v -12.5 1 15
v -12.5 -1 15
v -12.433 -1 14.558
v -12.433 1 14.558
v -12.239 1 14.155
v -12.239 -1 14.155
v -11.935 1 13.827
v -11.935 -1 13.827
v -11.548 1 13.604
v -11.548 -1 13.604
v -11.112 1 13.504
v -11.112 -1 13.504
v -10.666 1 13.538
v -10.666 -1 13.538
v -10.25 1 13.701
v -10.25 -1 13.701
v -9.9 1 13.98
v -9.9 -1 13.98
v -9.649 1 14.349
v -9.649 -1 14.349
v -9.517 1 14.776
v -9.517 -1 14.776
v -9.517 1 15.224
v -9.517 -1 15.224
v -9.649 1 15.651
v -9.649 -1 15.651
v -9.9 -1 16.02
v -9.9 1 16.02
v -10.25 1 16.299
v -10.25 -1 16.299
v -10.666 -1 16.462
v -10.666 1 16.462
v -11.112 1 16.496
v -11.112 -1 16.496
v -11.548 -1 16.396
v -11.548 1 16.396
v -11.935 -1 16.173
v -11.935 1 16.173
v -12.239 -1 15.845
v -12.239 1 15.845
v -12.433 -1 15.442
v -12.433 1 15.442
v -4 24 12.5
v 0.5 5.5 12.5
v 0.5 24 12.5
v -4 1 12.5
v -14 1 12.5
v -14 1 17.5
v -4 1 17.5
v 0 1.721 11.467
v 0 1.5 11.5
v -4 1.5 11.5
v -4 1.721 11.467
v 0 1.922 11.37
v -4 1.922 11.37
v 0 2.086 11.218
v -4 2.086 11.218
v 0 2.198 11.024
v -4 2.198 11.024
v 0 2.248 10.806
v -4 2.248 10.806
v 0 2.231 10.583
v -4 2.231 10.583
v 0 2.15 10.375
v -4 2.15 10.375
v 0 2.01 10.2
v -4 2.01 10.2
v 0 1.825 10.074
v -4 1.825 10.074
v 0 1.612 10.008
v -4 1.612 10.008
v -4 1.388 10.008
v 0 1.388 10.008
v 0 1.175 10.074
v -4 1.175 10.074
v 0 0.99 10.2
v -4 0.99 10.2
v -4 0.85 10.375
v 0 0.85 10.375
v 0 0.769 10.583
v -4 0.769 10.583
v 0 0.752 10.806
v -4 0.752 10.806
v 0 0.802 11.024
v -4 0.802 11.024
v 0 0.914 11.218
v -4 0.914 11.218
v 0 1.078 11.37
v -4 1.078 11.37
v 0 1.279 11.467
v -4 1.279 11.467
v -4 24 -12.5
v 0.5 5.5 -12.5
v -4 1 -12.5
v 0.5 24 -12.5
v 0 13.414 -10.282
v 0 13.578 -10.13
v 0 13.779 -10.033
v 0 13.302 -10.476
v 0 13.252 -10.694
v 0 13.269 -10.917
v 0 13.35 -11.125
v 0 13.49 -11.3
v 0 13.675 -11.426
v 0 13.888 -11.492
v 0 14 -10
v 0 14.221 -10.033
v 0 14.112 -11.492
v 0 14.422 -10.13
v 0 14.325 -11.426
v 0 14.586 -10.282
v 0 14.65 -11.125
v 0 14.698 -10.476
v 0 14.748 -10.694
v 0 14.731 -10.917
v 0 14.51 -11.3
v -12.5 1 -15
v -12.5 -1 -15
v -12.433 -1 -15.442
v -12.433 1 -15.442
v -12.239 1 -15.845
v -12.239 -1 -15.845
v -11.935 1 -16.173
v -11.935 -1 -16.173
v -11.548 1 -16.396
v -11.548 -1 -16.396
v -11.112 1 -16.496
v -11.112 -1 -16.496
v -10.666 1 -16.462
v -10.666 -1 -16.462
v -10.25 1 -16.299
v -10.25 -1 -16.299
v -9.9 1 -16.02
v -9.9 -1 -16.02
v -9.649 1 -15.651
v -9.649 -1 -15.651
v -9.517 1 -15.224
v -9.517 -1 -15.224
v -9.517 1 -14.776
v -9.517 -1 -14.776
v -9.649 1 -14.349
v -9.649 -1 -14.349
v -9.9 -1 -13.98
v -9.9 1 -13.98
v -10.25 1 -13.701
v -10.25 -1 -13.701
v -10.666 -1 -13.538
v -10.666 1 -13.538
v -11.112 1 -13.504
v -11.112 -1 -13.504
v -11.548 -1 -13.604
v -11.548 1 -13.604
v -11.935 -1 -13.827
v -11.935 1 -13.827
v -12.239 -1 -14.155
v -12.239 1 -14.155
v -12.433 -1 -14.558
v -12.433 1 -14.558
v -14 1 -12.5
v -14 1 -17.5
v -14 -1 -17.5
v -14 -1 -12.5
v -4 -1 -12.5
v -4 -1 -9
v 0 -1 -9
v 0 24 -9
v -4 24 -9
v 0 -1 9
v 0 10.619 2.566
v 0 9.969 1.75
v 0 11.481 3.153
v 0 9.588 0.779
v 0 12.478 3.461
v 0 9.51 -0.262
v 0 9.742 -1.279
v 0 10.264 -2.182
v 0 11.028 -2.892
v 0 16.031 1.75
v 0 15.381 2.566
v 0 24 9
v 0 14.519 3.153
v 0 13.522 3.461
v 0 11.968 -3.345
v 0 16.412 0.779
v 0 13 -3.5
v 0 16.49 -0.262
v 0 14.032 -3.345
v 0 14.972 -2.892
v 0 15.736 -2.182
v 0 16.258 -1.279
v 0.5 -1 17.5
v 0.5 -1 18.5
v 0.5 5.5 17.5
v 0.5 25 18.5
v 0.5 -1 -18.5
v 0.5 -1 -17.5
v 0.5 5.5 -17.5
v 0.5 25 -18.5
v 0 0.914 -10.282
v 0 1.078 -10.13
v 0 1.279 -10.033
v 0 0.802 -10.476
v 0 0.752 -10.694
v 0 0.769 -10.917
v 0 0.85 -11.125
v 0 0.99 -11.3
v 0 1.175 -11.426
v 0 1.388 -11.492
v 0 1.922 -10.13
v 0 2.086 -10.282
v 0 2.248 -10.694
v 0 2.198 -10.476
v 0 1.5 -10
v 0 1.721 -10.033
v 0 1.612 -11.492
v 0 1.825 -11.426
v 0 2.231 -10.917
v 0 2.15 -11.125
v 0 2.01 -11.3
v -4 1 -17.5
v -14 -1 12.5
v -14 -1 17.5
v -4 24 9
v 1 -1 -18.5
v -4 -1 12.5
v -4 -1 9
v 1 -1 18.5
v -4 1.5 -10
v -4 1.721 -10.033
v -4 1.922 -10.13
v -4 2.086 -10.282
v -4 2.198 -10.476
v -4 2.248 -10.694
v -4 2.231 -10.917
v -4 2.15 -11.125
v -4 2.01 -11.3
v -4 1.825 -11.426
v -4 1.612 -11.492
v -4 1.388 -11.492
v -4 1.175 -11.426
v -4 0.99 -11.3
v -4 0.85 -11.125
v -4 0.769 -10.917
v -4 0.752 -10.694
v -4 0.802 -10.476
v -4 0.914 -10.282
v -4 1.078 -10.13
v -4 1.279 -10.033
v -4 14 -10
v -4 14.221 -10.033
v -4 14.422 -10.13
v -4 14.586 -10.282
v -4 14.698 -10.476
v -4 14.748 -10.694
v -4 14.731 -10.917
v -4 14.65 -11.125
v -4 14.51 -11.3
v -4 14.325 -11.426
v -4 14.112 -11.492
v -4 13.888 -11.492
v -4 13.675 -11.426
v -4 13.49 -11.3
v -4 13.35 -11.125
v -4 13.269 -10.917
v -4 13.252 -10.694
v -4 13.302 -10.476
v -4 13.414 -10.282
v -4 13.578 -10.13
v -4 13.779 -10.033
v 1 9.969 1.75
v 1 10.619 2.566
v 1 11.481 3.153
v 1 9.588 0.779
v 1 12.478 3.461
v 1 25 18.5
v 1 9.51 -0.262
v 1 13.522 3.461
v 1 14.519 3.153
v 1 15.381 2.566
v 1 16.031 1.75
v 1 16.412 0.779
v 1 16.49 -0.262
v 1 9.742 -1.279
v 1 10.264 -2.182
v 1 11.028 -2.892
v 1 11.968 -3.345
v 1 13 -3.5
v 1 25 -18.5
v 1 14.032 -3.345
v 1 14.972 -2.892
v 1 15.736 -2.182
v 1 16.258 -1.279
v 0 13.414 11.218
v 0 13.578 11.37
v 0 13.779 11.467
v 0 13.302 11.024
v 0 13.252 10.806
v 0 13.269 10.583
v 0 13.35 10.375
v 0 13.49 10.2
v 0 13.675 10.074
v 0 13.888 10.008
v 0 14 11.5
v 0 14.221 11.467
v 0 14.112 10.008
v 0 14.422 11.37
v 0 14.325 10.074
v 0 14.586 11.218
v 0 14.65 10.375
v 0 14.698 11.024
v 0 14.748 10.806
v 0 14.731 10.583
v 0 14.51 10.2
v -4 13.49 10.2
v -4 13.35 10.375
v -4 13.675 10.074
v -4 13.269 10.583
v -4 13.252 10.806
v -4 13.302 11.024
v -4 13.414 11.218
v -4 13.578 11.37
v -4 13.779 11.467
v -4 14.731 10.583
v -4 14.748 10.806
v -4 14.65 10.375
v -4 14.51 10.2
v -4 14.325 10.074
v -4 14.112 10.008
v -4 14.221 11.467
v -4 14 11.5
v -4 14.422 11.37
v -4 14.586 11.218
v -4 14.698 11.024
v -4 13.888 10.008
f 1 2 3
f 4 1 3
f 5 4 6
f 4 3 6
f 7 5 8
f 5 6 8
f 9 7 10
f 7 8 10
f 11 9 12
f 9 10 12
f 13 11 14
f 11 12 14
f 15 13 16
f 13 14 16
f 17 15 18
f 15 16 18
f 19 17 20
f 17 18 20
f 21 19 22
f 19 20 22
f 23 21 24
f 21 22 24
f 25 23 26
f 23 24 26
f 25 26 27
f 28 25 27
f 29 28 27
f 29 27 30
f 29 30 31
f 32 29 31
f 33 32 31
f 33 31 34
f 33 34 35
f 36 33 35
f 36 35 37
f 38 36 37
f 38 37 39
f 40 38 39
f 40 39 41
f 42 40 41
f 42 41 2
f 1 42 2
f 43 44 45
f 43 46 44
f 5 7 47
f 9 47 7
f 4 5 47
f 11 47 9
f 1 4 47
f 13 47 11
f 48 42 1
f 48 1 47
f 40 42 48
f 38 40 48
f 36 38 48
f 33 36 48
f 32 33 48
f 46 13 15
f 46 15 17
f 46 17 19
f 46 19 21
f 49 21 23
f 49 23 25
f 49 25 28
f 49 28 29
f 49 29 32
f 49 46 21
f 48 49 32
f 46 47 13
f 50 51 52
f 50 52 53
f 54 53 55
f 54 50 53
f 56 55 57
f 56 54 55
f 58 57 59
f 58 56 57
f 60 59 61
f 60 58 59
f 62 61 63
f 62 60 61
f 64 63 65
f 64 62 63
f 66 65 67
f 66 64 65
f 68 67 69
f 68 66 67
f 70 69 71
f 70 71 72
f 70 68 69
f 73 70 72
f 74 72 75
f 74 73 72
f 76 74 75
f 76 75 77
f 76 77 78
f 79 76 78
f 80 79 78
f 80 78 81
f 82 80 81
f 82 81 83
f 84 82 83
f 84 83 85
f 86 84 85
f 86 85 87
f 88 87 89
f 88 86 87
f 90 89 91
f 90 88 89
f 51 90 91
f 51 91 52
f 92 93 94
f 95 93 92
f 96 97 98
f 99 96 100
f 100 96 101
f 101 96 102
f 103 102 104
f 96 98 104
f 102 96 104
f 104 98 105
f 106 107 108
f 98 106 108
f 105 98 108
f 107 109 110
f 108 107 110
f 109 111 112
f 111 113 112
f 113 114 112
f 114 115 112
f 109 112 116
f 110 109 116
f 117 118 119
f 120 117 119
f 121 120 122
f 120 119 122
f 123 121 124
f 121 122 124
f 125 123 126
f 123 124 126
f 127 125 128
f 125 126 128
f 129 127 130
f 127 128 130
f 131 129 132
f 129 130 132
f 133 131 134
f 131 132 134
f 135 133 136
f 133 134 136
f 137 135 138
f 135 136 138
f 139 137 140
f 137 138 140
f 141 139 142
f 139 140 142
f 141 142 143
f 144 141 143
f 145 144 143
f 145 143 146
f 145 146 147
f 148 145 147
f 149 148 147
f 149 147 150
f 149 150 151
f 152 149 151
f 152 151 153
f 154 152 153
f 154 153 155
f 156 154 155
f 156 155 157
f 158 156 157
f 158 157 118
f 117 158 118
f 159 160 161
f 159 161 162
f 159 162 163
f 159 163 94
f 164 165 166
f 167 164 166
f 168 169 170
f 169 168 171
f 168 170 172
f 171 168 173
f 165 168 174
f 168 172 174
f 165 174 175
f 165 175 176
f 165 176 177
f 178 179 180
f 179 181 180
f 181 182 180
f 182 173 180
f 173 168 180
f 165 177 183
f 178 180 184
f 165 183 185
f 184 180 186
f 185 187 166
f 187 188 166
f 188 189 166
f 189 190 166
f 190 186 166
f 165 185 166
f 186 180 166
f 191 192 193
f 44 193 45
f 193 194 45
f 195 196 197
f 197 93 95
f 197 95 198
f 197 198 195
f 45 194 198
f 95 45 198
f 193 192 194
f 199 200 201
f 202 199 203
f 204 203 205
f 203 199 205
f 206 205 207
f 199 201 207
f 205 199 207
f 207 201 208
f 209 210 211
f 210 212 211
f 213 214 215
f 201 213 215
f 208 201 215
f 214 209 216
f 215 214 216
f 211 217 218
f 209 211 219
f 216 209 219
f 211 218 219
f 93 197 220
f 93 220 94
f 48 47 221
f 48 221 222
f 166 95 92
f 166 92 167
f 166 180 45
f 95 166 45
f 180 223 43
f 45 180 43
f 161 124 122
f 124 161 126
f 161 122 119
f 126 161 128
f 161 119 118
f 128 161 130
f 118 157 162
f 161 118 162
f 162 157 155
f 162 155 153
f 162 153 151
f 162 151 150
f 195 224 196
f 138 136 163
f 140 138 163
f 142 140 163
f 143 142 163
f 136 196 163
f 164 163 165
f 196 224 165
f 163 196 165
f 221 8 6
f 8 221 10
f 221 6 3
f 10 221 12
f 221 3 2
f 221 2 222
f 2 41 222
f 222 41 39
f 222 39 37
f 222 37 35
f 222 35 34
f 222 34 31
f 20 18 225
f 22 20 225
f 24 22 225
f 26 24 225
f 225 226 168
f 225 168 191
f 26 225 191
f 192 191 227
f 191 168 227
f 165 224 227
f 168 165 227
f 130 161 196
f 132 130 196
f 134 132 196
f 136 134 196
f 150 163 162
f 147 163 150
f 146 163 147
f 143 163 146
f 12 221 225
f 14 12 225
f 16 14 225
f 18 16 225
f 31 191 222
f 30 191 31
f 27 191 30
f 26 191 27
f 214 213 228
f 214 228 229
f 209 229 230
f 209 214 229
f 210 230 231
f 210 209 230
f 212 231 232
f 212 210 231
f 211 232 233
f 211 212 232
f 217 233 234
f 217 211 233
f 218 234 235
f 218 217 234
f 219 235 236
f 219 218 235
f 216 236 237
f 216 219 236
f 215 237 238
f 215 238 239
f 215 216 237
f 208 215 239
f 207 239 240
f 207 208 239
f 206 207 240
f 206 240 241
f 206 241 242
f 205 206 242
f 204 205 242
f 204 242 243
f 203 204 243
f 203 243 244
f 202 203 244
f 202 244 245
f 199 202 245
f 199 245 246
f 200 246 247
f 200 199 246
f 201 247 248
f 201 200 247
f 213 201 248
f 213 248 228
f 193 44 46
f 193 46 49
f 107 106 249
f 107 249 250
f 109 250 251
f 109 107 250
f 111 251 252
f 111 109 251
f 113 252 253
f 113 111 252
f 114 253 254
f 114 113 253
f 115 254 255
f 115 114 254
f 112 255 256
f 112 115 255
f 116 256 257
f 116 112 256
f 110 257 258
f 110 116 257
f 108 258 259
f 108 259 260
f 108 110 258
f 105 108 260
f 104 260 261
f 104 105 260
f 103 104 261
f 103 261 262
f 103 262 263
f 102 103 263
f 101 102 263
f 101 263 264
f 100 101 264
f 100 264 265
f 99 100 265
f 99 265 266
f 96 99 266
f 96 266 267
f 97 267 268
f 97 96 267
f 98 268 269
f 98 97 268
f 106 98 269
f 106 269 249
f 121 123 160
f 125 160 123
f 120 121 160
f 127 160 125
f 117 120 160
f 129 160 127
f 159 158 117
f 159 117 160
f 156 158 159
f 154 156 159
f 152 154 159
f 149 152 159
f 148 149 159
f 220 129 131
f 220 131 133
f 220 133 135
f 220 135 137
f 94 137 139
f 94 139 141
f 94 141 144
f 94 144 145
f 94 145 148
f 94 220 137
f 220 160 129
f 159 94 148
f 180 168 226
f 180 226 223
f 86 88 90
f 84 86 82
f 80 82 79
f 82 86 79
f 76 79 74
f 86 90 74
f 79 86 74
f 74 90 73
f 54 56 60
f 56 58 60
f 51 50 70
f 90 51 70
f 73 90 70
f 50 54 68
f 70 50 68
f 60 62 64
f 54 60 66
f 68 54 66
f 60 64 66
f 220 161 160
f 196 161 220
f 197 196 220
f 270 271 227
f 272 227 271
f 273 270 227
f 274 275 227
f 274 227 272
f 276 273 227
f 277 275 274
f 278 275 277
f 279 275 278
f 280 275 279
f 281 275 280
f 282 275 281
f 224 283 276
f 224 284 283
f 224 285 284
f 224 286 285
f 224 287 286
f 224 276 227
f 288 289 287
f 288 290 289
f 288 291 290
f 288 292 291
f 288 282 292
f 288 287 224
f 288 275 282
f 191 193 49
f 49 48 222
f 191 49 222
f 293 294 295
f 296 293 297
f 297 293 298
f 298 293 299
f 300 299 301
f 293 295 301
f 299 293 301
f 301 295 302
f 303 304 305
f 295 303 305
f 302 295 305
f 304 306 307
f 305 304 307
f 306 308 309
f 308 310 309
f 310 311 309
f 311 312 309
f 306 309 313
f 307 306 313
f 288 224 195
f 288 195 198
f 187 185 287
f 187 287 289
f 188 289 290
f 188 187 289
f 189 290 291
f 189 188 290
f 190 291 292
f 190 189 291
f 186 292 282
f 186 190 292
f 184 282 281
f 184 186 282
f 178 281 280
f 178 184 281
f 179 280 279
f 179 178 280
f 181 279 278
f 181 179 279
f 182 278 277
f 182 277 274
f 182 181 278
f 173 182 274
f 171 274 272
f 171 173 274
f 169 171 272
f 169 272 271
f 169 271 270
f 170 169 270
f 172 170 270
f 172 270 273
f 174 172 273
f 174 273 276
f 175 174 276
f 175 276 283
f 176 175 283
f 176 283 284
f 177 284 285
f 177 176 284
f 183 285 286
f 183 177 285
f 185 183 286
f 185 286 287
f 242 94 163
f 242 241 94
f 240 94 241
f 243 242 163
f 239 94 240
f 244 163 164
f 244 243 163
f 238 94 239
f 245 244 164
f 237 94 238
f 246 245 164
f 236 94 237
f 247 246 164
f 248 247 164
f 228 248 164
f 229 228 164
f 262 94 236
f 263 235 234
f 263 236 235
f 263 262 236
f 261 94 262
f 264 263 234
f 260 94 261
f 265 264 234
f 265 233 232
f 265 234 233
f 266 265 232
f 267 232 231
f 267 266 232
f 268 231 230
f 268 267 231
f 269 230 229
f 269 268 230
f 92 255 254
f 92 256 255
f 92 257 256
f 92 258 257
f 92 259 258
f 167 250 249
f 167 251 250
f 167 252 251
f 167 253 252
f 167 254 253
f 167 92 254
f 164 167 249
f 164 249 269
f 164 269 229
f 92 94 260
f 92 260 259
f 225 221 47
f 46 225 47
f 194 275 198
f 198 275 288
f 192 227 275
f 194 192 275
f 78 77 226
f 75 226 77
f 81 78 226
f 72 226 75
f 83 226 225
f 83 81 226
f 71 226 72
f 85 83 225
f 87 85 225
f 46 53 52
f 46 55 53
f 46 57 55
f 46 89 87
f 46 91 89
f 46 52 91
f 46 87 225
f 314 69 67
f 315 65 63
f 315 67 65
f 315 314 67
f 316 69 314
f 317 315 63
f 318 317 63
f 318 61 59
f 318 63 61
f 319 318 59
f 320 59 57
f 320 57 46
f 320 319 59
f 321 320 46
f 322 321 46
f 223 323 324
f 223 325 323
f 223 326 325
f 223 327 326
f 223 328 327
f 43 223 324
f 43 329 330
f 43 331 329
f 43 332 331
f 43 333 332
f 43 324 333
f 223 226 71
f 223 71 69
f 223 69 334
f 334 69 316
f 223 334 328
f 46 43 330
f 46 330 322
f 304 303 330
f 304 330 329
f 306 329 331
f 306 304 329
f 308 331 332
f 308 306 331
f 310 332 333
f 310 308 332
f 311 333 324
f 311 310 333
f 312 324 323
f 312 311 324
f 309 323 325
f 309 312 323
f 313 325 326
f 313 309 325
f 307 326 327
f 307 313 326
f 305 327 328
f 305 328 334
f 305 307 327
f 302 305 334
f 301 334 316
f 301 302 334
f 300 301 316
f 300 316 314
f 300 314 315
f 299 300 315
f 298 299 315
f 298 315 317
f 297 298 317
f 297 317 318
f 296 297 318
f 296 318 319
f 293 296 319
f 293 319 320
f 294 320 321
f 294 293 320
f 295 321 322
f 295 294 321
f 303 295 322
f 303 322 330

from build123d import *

# Parameters (mm, degrees)
SKIZZE2_W                      = 25
SKIZZE2_H                      = 25
SKIZZE2_R                      = 3.5
FRONT_FACE_DEPTH               = 1
SKIZZE3_W                      = 3.5
SKIZZE3_H                      = 26
SKIZZE3_R                      = 0.75
CAMERA_SPACER_DEPTH            = 4
FLOOR_PLATE_DEPTH              = 14
FLOOR_PLATE_DEPTH_BACK         = 0.5
SKIZZE6_W                      = 5
SKIZZE6_H                      = 2
SKIZZE7_W                      = 6
SKIZZE7_H                      = 26
SIDE_COVERS_DEPTH              = 0.5
TOP_COVER_REACH                = 34.669
SKIZZE8_W                      = 25
SKIZZE8_H                      = 1
FASE1_SIZE                     = 4.5
F_3_0_3_DURCHMESSER_BOHRUNG1_D = 3


with BuildPart() as part:
    # Skizze2 → Front Face (new body)
    # profile 1 of 2: a face of its own
    with BuildSketch(Plane(origin=(0, 0, 0), x_dir=(0, 0, -1), z_dir=(1, 0, 0))):
        with Locations((0, 12.5)):
            Rectangle(SKIZZE2_W, SKIZZE2_H)
        with Locations((0, 13)):
            Circle(SKIZZE2_R, mode=Mode.SUBTRACT)
    # profile 2 of 2: a face of its own
    with BuildSketch(Plane(origin=(0, 0, 0), x_dir=(0, 0, -1), z_dir=(1, 0, 0))):
        Polygon((12.5, 0), (-12.5, 0), (-17.5, 0), (-17.5, -1), (17.5, -1), (17.5, 0), align=None)
    extrude(amount=FRONT_FACE_DEPTH)

    # Skizze3 → Camera Spacer (add)
    # profile 1 of 2: a face of its own
    with BuildSketch(Plane.ZY):
        with Locations((-10.75, 12)):
            Rectangle(SKIZZE3_W, SKIZZE3_H)
        with Locations((-10.75, 14)):
            Circle(SKIZZE3_R, mode=Mode.SUBTRACT)
        with Locations((-10.75, 1.5)):
            Circle(SKIZZE3_R, mode=Mode.SUBTRACT)
    # profile 2 of 2: a face of its own
    with BuildSketch(Plane.ZY):
        with Locations((10.75, 12)):
            Rectangle(SKIZZE3_W, SKIZZE3_H)
        with Locations((10.75, 1.5)):
            Circle(SKIZZE3_R, mode=Mode.SUBTRACT)
        with Locations((10.75, 14)):
            Circle(SKIZZE3_R, mode=Mode.SUBTRACT)
    extrude(amount=CAMERA_SPACER_DEPTH)

    # Skizze6 → Floor Plate (add, two sides: drawn at the far end of the back side and taken through both)
    with BuildSketch(Plane.ZY.offset(-FLOOR_PLATE_DEPTH_BACK)):
        with Locations((-15, 0)):
            Rectangle(SKIZZE6_W, SKIZZE6_H)
        with Locations((15, 0)):
            Rectangle(SKIZZE6_W, SKIZZE6_H)
    extrude(amount=FLOOR_PLATE_DEPTH + FLOOR_PLATE_DEPTH_BACK)

    # Skizze7 → Side Covers (add)
    with BuildSketch(Plane(origin=(1, 0, 0), x_dir=(0, 0, -1), z_dir=(1, 0, 0))):
        with Locations((15.5, 12)):
            Rectangle(SKIZZE7_W, SKIZZE7_H)
        with Locations((-15.5, 12)):
            Rectangle(SKIZZE7_W, SKIZZE7_H)
    extrude(amount=-SIDE_COVERS_DEPTH)

    # Top Cover: up to this face of the body (flat: up to its plane)
    top_cover_end = Plane(part.part.faces().sort_by_distance((0.5, 12.821917808, -15.534246575))[0])
    # Skizze8 → Top Cover (cut, up to the picked face)
    with BuildSketch(Plane.ZY.offset(4), mode=Mode.PRIVATE) as top_cover_sk1:
        with Locations((0, 24.5)):
            Rectangle(SKIZZE8_W, SKIZZE8_H)
    top_cover_tool1 = split(extrude(top_cover_sk1.sketch, amount=-TOP_COVER_REACH, mode=Mode.PRIVATE), bisect_by=top_cover_end, keep=Keep.BOTH, mode=Mode.PRIVATE)
    add(top_cover_tool1.solids().sort_by(Axis((-4, 24.5, 0), (1, 0, 0)))[0], mode=Mode.SUBTRACT)

    # Fase1
    fase1_edges = [part.edges().sort_by_distance(p)[0] for p in [
        (0.5, 1, 15),
        (0.5, 1, -15),
    ]]
    chamfer(fase1_edges, length=FASE1_SIZE)

    # Ø3.0 (3) Durchmesser Bohrung1 (through all)
    with Locations(Plane(origin=(0, 1, 0), x_dir=(1, 0, 0), z_dir=(0, 1, 0))):
        with Locations((-11, 15), (-11, -15)):
            Hole(F_3_0_3_DURCHMESSER_BOHRUNG1_D / 2)


solid = part.part
